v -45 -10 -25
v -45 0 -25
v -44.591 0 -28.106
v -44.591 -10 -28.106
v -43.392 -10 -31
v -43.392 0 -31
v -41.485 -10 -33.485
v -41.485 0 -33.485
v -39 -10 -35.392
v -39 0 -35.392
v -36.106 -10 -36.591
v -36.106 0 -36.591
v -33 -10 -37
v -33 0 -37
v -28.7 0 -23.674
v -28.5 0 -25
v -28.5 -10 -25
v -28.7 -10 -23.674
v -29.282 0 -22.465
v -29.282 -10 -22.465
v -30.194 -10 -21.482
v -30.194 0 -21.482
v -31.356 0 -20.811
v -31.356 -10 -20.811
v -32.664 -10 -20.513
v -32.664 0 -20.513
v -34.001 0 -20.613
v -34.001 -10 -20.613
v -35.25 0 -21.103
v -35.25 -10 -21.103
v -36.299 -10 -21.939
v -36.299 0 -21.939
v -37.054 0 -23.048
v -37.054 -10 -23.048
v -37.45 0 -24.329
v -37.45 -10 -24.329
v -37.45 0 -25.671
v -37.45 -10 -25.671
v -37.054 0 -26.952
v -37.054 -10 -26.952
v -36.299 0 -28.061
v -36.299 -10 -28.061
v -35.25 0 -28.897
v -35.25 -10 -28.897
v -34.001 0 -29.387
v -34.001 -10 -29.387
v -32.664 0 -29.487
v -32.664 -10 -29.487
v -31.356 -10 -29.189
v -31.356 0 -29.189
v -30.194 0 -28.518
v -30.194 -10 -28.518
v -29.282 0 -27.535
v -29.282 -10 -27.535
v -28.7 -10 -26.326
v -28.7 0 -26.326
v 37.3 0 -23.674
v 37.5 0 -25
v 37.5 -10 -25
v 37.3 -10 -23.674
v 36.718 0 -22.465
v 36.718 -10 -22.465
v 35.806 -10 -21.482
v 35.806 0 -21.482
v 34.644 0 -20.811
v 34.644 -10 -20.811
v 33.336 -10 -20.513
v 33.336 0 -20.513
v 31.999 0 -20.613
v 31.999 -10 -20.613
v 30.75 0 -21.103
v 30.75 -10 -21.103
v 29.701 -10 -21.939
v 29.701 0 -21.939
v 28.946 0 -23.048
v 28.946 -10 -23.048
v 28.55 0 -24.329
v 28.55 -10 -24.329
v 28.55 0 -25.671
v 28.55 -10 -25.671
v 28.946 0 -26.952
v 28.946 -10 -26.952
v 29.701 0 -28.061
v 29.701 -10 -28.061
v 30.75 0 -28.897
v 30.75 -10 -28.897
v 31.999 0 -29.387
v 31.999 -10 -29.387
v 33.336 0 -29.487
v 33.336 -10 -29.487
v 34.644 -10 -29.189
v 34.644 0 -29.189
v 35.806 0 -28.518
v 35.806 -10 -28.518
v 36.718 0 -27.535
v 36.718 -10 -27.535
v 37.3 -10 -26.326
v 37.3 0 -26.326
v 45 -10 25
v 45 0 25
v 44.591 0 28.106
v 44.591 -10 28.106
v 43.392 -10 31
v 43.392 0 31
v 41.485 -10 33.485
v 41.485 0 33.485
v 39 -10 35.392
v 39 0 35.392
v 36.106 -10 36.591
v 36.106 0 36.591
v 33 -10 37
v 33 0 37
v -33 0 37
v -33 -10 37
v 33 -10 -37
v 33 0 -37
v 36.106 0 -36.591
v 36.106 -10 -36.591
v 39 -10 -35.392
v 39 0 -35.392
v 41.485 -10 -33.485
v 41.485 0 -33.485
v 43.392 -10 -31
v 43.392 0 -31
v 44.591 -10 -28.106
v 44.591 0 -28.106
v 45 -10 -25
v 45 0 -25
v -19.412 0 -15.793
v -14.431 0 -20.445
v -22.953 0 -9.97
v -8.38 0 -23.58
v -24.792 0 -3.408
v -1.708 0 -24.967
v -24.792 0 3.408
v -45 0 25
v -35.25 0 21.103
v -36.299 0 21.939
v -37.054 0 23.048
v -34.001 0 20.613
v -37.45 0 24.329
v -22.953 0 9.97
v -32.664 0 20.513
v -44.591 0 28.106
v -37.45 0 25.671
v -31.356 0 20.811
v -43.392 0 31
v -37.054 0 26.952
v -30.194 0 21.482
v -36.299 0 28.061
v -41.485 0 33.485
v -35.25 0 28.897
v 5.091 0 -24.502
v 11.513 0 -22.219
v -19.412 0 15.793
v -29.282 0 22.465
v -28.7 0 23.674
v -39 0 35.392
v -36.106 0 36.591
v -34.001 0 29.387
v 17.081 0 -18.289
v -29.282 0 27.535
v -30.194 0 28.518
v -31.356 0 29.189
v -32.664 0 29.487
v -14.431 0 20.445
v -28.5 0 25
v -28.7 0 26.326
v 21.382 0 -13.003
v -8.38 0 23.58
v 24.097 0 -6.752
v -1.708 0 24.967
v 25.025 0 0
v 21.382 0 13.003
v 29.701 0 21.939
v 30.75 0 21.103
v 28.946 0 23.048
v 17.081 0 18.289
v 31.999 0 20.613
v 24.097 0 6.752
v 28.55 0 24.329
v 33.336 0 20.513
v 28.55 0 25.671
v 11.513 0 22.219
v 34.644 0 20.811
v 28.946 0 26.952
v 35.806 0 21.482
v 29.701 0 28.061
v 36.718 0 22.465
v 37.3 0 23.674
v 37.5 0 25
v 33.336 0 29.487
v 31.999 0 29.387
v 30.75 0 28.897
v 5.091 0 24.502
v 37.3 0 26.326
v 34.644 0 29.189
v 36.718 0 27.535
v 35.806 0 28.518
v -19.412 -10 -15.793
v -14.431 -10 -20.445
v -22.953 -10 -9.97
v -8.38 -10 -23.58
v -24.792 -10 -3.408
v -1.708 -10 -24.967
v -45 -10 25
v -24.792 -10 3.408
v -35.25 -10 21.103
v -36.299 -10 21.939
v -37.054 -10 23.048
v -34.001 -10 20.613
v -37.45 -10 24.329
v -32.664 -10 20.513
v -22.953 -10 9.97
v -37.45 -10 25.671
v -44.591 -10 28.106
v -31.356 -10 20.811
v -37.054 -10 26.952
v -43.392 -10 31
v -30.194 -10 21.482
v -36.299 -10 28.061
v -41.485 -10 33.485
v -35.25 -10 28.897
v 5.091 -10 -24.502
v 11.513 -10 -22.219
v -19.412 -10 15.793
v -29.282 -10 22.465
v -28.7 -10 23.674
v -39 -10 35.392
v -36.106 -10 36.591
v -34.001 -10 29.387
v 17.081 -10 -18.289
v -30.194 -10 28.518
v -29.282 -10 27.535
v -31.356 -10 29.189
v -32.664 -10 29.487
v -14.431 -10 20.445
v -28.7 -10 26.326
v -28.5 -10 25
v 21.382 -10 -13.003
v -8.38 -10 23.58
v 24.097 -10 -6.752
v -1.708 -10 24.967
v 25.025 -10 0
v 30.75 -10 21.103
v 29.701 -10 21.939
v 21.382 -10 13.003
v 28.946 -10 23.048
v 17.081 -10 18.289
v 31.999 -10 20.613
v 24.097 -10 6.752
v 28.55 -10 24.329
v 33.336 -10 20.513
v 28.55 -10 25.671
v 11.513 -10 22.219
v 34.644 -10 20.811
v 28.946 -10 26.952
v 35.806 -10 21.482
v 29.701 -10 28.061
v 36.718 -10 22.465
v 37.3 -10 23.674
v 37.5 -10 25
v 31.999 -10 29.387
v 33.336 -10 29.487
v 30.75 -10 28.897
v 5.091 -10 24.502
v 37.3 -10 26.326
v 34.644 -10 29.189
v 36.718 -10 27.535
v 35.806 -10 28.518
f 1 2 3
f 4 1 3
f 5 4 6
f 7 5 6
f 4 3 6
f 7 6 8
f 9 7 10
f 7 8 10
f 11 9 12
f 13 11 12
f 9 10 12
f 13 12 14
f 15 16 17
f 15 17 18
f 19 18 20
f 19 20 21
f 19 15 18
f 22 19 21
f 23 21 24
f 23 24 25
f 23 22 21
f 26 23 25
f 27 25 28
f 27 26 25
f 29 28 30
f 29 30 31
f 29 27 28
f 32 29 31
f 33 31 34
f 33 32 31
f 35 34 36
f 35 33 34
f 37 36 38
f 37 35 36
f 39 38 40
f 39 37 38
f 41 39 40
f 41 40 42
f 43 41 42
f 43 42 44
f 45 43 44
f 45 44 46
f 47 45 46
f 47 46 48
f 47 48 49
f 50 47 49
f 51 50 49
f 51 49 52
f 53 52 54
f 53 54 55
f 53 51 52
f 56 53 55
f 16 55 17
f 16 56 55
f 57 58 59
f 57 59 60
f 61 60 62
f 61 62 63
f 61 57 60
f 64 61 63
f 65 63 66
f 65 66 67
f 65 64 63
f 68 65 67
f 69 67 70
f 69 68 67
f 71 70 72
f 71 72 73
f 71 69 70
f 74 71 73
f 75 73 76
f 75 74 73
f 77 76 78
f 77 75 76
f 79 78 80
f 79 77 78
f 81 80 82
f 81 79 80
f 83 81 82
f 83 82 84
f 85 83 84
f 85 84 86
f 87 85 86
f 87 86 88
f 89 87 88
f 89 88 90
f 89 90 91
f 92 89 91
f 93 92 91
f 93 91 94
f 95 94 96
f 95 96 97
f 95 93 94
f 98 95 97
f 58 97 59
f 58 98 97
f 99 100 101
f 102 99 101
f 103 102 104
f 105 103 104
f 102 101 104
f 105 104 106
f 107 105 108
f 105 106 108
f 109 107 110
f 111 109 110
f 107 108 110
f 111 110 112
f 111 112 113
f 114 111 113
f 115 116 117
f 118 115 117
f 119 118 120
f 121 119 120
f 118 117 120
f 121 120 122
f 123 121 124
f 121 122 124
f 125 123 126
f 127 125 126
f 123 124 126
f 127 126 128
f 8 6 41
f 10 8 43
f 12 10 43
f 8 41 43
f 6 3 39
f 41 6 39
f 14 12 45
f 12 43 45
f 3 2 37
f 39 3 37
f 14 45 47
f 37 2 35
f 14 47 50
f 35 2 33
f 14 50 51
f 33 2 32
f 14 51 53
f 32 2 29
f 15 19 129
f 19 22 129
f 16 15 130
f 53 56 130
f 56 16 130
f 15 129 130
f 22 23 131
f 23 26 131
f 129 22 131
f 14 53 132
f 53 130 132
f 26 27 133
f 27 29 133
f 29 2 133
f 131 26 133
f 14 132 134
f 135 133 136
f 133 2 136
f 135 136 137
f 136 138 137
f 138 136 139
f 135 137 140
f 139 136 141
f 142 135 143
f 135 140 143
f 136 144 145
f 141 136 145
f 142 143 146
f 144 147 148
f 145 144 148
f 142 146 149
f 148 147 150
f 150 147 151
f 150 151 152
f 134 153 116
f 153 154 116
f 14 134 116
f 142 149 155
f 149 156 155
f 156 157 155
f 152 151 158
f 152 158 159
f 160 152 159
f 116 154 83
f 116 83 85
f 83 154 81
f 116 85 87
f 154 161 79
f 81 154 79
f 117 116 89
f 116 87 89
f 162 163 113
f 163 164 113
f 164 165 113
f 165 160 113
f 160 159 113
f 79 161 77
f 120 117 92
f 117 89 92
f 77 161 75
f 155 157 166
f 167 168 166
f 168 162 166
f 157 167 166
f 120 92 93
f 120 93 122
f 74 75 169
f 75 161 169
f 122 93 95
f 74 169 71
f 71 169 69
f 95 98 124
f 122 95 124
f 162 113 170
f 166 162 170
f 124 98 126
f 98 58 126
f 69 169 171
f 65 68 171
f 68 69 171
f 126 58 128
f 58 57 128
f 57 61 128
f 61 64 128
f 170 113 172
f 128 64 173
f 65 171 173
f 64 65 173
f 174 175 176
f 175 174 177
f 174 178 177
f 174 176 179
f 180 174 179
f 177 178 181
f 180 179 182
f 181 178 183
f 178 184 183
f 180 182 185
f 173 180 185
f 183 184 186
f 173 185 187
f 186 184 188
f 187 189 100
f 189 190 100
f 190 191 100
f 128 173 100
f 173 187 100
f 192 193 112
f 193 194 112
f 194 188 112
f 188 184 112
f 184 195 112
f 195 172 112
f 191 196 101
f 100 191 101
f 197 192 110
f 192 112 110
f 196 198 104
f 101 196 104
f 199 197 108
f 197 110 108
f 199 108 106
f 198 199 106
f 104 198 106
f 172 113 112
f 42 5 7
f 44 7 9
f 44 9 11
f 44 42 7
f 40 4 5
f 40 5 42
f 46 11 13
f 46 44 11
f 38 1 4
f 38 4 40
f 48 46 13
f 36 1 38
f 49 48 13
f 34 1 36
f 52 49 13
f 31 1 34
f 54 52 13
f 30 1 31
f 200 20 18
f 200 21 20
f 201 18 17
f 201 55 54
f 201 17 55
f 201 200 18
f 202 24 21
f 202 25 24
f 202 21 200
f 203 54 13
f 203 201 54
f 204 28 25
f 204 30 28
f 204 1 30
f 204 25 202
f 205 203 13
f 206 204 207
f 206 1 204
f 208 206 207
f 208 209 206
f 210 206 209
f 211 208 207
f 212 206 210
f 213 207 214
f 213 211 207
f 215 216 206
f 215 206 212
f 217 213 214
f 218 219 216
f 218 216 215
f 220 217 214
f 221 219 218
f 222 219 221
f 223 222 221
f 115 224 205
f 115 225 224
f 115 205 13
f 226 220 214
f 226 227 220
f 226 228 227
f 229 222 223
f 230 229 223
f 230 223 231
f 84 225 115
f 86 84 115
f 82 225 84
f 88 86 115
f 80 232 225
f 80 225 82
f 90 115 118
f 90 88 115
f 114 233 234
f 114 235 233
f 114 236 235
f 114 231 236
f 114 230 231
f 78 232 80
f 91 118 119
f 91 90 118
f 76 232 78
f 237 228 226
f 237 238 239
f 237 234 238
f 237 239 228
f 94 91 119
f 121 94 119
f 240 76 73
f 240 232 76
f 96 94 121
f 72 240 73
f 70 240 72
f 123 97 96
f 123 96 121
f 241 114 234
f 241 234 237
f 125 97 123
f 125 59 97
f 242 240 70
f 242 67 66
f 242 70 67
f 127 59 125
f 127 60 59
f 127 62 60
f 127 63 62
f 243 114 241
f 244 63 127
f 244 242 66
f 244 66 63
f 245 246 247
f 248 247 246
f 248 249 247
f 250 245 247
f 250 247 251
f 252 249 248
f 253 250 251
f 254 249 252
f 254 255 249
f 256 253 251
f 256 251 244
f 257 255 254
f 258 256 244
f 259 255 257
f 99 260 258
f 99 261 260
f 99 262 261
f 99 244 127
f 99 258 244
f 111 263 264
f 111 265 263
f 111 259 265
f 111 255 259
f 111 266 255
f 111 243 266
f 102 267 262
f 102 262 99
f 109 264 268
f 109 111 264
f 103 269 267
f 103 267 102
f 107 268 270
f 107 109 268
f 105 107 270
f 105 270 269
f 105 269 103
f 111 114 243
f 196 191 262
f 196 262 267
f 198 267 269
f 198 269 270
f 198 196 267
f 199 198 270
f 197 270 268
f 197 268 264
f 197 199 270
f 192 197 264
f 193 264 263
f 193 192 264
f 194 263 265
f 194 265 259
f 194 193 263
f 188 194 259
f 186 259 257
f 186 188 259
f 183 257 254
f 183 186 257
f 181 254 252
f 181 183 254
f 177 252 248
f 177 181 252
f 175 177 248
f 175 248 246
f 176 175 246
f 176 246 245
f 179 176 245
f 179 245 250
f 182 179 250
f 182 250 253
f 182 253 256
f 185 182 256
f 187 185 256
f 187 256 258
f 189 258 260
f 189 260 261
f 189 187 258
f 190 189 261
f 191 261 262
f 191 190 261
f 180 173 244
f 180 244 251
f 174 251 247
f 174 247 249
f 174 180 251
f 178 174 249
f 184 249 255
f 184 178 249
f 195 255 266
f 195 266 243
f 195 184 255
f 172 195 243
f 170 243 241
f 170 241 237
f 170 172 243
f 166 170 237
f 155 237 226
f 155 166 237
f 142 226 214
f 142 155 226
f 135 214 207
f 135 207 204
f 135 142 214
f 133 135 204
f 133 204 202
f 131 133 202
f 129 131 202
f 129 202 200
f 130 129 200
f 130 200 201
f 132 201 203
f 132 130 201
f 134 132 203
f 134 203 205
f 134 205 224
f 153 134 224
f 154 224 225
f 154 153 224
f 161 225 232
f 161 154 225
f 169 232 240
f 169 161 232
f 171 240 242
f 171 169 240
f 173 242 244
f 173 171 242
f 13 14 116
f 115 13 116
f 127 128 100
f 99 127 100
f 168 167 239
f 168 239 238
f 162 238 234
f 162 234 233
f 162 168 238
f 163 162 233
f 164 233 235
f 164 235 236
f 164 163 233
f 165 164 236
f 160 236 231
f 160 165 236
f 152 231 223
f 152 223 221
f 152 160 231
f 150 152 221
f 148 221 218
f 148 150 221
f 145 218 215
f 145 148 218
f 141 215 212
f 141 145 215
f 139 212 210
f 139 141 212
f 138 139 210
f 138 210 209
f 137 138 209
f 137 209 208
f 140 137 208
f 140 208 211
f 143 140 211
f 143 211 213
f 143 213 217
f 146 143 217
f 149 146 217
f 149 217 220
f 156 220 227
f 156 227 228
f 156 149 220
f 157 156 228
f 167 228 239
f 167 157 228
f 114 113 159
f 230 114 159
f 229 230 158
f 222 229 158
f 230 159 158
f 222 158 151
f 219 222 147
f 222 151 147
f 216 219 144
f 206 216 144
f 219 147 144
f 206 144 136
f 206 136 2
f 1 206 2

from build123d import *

# Parameters (mm, degrees)
F0_R     = 4.5
F0_R_2   = 25.025
F1_DEPTH = 10


with BuildPart() as f1:
    # F0 (on Front) → F1 (new body)
    with BuildSketch(Plane.XZ):
        with BuildLine():
            ThreePointArc((-33, 37), (-41.485281, 33.485281), (-45, 25))
            Line((-45, 25), (-45, -25))
            ThreePointArc((-45, -25), (-41.485281, -33.485281), (-33, -37))
            Line((-33, -37), (33, -37))
            ThreePointArc((33, -37), (41.485281, -33.485281), (45, -25))
            Line((45, -25), (45, 25))
            ThreePointArc((45, 25), (41.485281, 33.485281), (33, 37))
            Line((33, 37), (-33, 37))
        make_face()
        with Locations((-33, -25)):
            Circle(F0_R, mode=Mode.SUBTRACT)
        with Locations((33, -25)):
            Circle(F0_R, mode=Mode.SUBTRACT)
        with Locations((-33, 25)):
            Circle(F0_R, mode=Mode.SUBTRACT)
        Circle(F0_R_2, mode=Mode.SUBTRACT)
        with Locations((33, 25)):
            Circle(F0_R, mode=Mode.SUBTRACT)
    extrude(amount=F1_DEPTH)


solid = f1.part
